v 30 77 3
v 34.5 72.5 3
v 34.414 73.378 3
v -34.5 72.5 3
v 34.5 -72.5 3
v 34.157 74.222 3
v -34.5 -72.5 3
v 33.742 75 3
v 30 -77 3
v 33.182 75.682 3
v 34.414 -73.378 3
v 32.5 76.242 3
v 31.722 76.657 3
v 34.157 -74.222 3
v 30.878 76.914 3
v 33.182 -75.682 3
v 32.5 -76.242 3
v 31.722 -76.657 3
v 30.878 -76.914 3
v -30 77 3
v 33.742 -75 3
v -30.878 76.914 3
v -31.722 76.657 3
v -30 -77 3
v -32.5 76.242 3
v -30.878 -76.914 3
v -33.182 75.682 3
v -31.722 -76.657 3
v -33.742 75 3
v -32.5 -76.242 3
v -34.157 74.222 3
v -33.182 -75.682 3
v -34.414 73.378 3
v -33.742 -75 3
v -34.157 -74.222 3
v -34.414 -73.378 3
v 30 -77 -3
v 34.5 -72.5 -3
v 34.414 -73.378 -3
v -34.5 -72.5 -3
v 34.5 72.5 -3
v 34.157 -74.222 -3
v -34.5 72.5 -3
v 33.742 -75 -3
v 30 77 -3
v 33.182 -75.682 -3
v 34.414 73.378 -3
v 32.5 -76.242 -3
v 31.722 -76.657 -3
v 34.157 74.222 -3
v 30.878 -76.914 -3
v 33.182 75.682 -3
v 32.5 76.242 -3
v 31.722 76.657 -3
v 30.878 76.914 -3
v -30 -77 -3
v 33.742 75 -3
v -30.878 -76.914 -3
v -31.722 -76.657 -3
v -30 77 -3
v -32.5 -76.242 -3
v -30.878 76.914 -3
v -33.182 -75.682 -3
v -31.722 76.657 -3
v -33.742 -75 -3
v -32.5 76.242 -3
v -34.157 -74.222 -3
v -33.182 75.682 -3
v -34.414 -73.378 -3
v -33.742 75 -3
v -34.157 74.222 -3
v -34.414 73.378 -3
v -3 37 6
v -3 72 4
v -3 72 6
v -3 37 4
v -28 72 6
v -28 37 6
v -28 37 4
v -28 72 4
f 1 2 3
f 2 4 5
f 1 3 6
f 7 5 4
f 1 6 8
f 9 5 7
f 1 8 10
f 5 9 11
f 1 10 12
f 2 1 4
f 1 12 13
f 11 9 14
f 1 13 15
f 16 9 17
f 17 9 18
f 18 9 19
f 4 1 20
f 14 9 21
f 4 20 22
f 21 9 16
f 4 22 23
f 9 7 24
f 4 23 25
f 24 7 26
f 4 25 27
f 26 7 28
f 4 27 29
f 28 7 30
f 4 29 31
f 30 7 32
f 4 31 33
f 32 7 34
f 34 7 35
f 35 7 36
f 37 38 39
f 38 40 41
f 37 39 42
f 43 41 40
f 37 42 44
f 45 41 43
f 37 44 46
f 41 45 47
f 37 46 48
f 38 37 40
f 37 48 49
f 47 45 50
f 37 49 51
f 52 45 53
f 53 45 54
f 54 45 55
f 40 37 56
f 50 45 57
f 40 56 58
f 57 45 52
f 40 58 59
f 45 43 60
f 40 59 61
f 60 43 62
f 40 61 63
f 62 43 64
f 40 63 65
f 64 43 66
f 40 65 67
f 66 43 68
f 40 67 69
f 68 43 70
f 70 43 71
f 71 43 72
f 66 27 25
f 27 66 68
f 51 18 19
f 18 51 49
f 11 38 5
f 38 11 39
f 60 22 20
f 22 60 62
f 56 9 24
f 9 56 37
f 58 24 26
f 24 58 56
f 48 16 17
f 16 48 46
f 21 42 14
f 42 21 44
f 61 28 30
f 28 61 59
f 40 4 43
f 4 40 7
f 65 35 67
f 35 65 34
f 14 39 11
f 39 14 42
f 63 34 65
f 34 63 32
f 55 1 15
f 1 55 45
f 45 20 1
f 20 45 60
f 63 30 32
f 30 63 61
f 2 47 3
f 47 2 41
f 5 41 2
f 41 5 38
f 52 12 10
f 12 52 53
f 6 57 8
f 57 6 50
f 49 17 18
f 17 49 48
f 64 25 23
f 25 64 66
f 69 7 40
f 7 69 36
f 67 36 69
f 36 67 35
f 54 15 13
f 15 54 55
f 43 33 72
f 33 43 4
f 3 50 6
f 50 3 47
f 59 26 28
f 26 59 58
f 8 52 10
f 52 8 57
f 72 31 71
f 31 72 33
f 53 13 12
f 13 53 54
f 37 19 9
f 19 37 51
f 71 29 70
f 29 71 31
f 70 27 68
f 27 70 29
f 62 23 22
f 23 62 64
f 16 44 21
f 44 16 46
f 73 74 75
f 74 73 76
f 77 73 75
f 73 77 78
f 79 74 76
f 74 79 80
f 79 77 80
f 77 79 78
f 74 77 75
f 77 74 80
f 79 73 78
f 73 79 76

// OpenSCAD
echo("Работа Павла Семенова");
len_phone = 145;
width_phone = 60;
thickness_phone = 6;
cube([width_phone, len_phone, thickness_phone], center=true);

hull() {
    color("red")
    translate([width_phone/2, len_phone/2, 0])
    cylinder(h=thickness_phone, d=8, $fn=32, center=true);

    mirror([1,0,0])
    color("red")
    translate([width_phone/2, len_phone/2, 0])
    cylinder(h=thickness_phone, d=8, $fn=32, center=true);

    mirror([0,1,0])
    color("red")
    translate([width_phone/2, len_phone/2, 0])
    cylinder(h=thickness_phone, d=8, $fn=32, center=true);

    mirror([1,0,0])
    mirror([0,1,0])
    color("red")
    translate([width_phone/2, len_phone/2, 0])
    cylinder(h=thickness_phone, d=8, $fn=32, center=true);
}





echo("Работа Павла Семенова");
len_phone = 145;
width_phone = 60;
thickness_phone = 6;

corner_round = 9;

cube([width_phone, len_phone, thickness_phone], center=true);

module smartphone() {
    hull() {
        color("red")
        translate([width_phone/2, len_phone/2, 0])
        cylinder(h=thickness_phone, d=corner_round, $fn=32, center=true);

        mirror([1,0,0])
        color("red")
        translate([width_phone/2, len_phone/2, 0])
        cylinder(h=thickness_phone, d=corner_round, $fn=32, center=true);

        mirror([0,1,0])
        color("red")
        translate([width_phone/2, len_phone/2, 0])
        cylinder(h=thickness_phone, d=corner_round, $fn=32, center=true);

        mirror([1,0,0])
        mirror([0,1,0])
        color("red")
        translate([width_phone/2, len_phone/2, 0])
        cylinder(h=thickness_phone, d=corner_round, $fn=32, center=true);
    }
}


h = 3;

smartphone();
color("red")
translate([-28, 37, 4])
cube([25, 35, 2]);
